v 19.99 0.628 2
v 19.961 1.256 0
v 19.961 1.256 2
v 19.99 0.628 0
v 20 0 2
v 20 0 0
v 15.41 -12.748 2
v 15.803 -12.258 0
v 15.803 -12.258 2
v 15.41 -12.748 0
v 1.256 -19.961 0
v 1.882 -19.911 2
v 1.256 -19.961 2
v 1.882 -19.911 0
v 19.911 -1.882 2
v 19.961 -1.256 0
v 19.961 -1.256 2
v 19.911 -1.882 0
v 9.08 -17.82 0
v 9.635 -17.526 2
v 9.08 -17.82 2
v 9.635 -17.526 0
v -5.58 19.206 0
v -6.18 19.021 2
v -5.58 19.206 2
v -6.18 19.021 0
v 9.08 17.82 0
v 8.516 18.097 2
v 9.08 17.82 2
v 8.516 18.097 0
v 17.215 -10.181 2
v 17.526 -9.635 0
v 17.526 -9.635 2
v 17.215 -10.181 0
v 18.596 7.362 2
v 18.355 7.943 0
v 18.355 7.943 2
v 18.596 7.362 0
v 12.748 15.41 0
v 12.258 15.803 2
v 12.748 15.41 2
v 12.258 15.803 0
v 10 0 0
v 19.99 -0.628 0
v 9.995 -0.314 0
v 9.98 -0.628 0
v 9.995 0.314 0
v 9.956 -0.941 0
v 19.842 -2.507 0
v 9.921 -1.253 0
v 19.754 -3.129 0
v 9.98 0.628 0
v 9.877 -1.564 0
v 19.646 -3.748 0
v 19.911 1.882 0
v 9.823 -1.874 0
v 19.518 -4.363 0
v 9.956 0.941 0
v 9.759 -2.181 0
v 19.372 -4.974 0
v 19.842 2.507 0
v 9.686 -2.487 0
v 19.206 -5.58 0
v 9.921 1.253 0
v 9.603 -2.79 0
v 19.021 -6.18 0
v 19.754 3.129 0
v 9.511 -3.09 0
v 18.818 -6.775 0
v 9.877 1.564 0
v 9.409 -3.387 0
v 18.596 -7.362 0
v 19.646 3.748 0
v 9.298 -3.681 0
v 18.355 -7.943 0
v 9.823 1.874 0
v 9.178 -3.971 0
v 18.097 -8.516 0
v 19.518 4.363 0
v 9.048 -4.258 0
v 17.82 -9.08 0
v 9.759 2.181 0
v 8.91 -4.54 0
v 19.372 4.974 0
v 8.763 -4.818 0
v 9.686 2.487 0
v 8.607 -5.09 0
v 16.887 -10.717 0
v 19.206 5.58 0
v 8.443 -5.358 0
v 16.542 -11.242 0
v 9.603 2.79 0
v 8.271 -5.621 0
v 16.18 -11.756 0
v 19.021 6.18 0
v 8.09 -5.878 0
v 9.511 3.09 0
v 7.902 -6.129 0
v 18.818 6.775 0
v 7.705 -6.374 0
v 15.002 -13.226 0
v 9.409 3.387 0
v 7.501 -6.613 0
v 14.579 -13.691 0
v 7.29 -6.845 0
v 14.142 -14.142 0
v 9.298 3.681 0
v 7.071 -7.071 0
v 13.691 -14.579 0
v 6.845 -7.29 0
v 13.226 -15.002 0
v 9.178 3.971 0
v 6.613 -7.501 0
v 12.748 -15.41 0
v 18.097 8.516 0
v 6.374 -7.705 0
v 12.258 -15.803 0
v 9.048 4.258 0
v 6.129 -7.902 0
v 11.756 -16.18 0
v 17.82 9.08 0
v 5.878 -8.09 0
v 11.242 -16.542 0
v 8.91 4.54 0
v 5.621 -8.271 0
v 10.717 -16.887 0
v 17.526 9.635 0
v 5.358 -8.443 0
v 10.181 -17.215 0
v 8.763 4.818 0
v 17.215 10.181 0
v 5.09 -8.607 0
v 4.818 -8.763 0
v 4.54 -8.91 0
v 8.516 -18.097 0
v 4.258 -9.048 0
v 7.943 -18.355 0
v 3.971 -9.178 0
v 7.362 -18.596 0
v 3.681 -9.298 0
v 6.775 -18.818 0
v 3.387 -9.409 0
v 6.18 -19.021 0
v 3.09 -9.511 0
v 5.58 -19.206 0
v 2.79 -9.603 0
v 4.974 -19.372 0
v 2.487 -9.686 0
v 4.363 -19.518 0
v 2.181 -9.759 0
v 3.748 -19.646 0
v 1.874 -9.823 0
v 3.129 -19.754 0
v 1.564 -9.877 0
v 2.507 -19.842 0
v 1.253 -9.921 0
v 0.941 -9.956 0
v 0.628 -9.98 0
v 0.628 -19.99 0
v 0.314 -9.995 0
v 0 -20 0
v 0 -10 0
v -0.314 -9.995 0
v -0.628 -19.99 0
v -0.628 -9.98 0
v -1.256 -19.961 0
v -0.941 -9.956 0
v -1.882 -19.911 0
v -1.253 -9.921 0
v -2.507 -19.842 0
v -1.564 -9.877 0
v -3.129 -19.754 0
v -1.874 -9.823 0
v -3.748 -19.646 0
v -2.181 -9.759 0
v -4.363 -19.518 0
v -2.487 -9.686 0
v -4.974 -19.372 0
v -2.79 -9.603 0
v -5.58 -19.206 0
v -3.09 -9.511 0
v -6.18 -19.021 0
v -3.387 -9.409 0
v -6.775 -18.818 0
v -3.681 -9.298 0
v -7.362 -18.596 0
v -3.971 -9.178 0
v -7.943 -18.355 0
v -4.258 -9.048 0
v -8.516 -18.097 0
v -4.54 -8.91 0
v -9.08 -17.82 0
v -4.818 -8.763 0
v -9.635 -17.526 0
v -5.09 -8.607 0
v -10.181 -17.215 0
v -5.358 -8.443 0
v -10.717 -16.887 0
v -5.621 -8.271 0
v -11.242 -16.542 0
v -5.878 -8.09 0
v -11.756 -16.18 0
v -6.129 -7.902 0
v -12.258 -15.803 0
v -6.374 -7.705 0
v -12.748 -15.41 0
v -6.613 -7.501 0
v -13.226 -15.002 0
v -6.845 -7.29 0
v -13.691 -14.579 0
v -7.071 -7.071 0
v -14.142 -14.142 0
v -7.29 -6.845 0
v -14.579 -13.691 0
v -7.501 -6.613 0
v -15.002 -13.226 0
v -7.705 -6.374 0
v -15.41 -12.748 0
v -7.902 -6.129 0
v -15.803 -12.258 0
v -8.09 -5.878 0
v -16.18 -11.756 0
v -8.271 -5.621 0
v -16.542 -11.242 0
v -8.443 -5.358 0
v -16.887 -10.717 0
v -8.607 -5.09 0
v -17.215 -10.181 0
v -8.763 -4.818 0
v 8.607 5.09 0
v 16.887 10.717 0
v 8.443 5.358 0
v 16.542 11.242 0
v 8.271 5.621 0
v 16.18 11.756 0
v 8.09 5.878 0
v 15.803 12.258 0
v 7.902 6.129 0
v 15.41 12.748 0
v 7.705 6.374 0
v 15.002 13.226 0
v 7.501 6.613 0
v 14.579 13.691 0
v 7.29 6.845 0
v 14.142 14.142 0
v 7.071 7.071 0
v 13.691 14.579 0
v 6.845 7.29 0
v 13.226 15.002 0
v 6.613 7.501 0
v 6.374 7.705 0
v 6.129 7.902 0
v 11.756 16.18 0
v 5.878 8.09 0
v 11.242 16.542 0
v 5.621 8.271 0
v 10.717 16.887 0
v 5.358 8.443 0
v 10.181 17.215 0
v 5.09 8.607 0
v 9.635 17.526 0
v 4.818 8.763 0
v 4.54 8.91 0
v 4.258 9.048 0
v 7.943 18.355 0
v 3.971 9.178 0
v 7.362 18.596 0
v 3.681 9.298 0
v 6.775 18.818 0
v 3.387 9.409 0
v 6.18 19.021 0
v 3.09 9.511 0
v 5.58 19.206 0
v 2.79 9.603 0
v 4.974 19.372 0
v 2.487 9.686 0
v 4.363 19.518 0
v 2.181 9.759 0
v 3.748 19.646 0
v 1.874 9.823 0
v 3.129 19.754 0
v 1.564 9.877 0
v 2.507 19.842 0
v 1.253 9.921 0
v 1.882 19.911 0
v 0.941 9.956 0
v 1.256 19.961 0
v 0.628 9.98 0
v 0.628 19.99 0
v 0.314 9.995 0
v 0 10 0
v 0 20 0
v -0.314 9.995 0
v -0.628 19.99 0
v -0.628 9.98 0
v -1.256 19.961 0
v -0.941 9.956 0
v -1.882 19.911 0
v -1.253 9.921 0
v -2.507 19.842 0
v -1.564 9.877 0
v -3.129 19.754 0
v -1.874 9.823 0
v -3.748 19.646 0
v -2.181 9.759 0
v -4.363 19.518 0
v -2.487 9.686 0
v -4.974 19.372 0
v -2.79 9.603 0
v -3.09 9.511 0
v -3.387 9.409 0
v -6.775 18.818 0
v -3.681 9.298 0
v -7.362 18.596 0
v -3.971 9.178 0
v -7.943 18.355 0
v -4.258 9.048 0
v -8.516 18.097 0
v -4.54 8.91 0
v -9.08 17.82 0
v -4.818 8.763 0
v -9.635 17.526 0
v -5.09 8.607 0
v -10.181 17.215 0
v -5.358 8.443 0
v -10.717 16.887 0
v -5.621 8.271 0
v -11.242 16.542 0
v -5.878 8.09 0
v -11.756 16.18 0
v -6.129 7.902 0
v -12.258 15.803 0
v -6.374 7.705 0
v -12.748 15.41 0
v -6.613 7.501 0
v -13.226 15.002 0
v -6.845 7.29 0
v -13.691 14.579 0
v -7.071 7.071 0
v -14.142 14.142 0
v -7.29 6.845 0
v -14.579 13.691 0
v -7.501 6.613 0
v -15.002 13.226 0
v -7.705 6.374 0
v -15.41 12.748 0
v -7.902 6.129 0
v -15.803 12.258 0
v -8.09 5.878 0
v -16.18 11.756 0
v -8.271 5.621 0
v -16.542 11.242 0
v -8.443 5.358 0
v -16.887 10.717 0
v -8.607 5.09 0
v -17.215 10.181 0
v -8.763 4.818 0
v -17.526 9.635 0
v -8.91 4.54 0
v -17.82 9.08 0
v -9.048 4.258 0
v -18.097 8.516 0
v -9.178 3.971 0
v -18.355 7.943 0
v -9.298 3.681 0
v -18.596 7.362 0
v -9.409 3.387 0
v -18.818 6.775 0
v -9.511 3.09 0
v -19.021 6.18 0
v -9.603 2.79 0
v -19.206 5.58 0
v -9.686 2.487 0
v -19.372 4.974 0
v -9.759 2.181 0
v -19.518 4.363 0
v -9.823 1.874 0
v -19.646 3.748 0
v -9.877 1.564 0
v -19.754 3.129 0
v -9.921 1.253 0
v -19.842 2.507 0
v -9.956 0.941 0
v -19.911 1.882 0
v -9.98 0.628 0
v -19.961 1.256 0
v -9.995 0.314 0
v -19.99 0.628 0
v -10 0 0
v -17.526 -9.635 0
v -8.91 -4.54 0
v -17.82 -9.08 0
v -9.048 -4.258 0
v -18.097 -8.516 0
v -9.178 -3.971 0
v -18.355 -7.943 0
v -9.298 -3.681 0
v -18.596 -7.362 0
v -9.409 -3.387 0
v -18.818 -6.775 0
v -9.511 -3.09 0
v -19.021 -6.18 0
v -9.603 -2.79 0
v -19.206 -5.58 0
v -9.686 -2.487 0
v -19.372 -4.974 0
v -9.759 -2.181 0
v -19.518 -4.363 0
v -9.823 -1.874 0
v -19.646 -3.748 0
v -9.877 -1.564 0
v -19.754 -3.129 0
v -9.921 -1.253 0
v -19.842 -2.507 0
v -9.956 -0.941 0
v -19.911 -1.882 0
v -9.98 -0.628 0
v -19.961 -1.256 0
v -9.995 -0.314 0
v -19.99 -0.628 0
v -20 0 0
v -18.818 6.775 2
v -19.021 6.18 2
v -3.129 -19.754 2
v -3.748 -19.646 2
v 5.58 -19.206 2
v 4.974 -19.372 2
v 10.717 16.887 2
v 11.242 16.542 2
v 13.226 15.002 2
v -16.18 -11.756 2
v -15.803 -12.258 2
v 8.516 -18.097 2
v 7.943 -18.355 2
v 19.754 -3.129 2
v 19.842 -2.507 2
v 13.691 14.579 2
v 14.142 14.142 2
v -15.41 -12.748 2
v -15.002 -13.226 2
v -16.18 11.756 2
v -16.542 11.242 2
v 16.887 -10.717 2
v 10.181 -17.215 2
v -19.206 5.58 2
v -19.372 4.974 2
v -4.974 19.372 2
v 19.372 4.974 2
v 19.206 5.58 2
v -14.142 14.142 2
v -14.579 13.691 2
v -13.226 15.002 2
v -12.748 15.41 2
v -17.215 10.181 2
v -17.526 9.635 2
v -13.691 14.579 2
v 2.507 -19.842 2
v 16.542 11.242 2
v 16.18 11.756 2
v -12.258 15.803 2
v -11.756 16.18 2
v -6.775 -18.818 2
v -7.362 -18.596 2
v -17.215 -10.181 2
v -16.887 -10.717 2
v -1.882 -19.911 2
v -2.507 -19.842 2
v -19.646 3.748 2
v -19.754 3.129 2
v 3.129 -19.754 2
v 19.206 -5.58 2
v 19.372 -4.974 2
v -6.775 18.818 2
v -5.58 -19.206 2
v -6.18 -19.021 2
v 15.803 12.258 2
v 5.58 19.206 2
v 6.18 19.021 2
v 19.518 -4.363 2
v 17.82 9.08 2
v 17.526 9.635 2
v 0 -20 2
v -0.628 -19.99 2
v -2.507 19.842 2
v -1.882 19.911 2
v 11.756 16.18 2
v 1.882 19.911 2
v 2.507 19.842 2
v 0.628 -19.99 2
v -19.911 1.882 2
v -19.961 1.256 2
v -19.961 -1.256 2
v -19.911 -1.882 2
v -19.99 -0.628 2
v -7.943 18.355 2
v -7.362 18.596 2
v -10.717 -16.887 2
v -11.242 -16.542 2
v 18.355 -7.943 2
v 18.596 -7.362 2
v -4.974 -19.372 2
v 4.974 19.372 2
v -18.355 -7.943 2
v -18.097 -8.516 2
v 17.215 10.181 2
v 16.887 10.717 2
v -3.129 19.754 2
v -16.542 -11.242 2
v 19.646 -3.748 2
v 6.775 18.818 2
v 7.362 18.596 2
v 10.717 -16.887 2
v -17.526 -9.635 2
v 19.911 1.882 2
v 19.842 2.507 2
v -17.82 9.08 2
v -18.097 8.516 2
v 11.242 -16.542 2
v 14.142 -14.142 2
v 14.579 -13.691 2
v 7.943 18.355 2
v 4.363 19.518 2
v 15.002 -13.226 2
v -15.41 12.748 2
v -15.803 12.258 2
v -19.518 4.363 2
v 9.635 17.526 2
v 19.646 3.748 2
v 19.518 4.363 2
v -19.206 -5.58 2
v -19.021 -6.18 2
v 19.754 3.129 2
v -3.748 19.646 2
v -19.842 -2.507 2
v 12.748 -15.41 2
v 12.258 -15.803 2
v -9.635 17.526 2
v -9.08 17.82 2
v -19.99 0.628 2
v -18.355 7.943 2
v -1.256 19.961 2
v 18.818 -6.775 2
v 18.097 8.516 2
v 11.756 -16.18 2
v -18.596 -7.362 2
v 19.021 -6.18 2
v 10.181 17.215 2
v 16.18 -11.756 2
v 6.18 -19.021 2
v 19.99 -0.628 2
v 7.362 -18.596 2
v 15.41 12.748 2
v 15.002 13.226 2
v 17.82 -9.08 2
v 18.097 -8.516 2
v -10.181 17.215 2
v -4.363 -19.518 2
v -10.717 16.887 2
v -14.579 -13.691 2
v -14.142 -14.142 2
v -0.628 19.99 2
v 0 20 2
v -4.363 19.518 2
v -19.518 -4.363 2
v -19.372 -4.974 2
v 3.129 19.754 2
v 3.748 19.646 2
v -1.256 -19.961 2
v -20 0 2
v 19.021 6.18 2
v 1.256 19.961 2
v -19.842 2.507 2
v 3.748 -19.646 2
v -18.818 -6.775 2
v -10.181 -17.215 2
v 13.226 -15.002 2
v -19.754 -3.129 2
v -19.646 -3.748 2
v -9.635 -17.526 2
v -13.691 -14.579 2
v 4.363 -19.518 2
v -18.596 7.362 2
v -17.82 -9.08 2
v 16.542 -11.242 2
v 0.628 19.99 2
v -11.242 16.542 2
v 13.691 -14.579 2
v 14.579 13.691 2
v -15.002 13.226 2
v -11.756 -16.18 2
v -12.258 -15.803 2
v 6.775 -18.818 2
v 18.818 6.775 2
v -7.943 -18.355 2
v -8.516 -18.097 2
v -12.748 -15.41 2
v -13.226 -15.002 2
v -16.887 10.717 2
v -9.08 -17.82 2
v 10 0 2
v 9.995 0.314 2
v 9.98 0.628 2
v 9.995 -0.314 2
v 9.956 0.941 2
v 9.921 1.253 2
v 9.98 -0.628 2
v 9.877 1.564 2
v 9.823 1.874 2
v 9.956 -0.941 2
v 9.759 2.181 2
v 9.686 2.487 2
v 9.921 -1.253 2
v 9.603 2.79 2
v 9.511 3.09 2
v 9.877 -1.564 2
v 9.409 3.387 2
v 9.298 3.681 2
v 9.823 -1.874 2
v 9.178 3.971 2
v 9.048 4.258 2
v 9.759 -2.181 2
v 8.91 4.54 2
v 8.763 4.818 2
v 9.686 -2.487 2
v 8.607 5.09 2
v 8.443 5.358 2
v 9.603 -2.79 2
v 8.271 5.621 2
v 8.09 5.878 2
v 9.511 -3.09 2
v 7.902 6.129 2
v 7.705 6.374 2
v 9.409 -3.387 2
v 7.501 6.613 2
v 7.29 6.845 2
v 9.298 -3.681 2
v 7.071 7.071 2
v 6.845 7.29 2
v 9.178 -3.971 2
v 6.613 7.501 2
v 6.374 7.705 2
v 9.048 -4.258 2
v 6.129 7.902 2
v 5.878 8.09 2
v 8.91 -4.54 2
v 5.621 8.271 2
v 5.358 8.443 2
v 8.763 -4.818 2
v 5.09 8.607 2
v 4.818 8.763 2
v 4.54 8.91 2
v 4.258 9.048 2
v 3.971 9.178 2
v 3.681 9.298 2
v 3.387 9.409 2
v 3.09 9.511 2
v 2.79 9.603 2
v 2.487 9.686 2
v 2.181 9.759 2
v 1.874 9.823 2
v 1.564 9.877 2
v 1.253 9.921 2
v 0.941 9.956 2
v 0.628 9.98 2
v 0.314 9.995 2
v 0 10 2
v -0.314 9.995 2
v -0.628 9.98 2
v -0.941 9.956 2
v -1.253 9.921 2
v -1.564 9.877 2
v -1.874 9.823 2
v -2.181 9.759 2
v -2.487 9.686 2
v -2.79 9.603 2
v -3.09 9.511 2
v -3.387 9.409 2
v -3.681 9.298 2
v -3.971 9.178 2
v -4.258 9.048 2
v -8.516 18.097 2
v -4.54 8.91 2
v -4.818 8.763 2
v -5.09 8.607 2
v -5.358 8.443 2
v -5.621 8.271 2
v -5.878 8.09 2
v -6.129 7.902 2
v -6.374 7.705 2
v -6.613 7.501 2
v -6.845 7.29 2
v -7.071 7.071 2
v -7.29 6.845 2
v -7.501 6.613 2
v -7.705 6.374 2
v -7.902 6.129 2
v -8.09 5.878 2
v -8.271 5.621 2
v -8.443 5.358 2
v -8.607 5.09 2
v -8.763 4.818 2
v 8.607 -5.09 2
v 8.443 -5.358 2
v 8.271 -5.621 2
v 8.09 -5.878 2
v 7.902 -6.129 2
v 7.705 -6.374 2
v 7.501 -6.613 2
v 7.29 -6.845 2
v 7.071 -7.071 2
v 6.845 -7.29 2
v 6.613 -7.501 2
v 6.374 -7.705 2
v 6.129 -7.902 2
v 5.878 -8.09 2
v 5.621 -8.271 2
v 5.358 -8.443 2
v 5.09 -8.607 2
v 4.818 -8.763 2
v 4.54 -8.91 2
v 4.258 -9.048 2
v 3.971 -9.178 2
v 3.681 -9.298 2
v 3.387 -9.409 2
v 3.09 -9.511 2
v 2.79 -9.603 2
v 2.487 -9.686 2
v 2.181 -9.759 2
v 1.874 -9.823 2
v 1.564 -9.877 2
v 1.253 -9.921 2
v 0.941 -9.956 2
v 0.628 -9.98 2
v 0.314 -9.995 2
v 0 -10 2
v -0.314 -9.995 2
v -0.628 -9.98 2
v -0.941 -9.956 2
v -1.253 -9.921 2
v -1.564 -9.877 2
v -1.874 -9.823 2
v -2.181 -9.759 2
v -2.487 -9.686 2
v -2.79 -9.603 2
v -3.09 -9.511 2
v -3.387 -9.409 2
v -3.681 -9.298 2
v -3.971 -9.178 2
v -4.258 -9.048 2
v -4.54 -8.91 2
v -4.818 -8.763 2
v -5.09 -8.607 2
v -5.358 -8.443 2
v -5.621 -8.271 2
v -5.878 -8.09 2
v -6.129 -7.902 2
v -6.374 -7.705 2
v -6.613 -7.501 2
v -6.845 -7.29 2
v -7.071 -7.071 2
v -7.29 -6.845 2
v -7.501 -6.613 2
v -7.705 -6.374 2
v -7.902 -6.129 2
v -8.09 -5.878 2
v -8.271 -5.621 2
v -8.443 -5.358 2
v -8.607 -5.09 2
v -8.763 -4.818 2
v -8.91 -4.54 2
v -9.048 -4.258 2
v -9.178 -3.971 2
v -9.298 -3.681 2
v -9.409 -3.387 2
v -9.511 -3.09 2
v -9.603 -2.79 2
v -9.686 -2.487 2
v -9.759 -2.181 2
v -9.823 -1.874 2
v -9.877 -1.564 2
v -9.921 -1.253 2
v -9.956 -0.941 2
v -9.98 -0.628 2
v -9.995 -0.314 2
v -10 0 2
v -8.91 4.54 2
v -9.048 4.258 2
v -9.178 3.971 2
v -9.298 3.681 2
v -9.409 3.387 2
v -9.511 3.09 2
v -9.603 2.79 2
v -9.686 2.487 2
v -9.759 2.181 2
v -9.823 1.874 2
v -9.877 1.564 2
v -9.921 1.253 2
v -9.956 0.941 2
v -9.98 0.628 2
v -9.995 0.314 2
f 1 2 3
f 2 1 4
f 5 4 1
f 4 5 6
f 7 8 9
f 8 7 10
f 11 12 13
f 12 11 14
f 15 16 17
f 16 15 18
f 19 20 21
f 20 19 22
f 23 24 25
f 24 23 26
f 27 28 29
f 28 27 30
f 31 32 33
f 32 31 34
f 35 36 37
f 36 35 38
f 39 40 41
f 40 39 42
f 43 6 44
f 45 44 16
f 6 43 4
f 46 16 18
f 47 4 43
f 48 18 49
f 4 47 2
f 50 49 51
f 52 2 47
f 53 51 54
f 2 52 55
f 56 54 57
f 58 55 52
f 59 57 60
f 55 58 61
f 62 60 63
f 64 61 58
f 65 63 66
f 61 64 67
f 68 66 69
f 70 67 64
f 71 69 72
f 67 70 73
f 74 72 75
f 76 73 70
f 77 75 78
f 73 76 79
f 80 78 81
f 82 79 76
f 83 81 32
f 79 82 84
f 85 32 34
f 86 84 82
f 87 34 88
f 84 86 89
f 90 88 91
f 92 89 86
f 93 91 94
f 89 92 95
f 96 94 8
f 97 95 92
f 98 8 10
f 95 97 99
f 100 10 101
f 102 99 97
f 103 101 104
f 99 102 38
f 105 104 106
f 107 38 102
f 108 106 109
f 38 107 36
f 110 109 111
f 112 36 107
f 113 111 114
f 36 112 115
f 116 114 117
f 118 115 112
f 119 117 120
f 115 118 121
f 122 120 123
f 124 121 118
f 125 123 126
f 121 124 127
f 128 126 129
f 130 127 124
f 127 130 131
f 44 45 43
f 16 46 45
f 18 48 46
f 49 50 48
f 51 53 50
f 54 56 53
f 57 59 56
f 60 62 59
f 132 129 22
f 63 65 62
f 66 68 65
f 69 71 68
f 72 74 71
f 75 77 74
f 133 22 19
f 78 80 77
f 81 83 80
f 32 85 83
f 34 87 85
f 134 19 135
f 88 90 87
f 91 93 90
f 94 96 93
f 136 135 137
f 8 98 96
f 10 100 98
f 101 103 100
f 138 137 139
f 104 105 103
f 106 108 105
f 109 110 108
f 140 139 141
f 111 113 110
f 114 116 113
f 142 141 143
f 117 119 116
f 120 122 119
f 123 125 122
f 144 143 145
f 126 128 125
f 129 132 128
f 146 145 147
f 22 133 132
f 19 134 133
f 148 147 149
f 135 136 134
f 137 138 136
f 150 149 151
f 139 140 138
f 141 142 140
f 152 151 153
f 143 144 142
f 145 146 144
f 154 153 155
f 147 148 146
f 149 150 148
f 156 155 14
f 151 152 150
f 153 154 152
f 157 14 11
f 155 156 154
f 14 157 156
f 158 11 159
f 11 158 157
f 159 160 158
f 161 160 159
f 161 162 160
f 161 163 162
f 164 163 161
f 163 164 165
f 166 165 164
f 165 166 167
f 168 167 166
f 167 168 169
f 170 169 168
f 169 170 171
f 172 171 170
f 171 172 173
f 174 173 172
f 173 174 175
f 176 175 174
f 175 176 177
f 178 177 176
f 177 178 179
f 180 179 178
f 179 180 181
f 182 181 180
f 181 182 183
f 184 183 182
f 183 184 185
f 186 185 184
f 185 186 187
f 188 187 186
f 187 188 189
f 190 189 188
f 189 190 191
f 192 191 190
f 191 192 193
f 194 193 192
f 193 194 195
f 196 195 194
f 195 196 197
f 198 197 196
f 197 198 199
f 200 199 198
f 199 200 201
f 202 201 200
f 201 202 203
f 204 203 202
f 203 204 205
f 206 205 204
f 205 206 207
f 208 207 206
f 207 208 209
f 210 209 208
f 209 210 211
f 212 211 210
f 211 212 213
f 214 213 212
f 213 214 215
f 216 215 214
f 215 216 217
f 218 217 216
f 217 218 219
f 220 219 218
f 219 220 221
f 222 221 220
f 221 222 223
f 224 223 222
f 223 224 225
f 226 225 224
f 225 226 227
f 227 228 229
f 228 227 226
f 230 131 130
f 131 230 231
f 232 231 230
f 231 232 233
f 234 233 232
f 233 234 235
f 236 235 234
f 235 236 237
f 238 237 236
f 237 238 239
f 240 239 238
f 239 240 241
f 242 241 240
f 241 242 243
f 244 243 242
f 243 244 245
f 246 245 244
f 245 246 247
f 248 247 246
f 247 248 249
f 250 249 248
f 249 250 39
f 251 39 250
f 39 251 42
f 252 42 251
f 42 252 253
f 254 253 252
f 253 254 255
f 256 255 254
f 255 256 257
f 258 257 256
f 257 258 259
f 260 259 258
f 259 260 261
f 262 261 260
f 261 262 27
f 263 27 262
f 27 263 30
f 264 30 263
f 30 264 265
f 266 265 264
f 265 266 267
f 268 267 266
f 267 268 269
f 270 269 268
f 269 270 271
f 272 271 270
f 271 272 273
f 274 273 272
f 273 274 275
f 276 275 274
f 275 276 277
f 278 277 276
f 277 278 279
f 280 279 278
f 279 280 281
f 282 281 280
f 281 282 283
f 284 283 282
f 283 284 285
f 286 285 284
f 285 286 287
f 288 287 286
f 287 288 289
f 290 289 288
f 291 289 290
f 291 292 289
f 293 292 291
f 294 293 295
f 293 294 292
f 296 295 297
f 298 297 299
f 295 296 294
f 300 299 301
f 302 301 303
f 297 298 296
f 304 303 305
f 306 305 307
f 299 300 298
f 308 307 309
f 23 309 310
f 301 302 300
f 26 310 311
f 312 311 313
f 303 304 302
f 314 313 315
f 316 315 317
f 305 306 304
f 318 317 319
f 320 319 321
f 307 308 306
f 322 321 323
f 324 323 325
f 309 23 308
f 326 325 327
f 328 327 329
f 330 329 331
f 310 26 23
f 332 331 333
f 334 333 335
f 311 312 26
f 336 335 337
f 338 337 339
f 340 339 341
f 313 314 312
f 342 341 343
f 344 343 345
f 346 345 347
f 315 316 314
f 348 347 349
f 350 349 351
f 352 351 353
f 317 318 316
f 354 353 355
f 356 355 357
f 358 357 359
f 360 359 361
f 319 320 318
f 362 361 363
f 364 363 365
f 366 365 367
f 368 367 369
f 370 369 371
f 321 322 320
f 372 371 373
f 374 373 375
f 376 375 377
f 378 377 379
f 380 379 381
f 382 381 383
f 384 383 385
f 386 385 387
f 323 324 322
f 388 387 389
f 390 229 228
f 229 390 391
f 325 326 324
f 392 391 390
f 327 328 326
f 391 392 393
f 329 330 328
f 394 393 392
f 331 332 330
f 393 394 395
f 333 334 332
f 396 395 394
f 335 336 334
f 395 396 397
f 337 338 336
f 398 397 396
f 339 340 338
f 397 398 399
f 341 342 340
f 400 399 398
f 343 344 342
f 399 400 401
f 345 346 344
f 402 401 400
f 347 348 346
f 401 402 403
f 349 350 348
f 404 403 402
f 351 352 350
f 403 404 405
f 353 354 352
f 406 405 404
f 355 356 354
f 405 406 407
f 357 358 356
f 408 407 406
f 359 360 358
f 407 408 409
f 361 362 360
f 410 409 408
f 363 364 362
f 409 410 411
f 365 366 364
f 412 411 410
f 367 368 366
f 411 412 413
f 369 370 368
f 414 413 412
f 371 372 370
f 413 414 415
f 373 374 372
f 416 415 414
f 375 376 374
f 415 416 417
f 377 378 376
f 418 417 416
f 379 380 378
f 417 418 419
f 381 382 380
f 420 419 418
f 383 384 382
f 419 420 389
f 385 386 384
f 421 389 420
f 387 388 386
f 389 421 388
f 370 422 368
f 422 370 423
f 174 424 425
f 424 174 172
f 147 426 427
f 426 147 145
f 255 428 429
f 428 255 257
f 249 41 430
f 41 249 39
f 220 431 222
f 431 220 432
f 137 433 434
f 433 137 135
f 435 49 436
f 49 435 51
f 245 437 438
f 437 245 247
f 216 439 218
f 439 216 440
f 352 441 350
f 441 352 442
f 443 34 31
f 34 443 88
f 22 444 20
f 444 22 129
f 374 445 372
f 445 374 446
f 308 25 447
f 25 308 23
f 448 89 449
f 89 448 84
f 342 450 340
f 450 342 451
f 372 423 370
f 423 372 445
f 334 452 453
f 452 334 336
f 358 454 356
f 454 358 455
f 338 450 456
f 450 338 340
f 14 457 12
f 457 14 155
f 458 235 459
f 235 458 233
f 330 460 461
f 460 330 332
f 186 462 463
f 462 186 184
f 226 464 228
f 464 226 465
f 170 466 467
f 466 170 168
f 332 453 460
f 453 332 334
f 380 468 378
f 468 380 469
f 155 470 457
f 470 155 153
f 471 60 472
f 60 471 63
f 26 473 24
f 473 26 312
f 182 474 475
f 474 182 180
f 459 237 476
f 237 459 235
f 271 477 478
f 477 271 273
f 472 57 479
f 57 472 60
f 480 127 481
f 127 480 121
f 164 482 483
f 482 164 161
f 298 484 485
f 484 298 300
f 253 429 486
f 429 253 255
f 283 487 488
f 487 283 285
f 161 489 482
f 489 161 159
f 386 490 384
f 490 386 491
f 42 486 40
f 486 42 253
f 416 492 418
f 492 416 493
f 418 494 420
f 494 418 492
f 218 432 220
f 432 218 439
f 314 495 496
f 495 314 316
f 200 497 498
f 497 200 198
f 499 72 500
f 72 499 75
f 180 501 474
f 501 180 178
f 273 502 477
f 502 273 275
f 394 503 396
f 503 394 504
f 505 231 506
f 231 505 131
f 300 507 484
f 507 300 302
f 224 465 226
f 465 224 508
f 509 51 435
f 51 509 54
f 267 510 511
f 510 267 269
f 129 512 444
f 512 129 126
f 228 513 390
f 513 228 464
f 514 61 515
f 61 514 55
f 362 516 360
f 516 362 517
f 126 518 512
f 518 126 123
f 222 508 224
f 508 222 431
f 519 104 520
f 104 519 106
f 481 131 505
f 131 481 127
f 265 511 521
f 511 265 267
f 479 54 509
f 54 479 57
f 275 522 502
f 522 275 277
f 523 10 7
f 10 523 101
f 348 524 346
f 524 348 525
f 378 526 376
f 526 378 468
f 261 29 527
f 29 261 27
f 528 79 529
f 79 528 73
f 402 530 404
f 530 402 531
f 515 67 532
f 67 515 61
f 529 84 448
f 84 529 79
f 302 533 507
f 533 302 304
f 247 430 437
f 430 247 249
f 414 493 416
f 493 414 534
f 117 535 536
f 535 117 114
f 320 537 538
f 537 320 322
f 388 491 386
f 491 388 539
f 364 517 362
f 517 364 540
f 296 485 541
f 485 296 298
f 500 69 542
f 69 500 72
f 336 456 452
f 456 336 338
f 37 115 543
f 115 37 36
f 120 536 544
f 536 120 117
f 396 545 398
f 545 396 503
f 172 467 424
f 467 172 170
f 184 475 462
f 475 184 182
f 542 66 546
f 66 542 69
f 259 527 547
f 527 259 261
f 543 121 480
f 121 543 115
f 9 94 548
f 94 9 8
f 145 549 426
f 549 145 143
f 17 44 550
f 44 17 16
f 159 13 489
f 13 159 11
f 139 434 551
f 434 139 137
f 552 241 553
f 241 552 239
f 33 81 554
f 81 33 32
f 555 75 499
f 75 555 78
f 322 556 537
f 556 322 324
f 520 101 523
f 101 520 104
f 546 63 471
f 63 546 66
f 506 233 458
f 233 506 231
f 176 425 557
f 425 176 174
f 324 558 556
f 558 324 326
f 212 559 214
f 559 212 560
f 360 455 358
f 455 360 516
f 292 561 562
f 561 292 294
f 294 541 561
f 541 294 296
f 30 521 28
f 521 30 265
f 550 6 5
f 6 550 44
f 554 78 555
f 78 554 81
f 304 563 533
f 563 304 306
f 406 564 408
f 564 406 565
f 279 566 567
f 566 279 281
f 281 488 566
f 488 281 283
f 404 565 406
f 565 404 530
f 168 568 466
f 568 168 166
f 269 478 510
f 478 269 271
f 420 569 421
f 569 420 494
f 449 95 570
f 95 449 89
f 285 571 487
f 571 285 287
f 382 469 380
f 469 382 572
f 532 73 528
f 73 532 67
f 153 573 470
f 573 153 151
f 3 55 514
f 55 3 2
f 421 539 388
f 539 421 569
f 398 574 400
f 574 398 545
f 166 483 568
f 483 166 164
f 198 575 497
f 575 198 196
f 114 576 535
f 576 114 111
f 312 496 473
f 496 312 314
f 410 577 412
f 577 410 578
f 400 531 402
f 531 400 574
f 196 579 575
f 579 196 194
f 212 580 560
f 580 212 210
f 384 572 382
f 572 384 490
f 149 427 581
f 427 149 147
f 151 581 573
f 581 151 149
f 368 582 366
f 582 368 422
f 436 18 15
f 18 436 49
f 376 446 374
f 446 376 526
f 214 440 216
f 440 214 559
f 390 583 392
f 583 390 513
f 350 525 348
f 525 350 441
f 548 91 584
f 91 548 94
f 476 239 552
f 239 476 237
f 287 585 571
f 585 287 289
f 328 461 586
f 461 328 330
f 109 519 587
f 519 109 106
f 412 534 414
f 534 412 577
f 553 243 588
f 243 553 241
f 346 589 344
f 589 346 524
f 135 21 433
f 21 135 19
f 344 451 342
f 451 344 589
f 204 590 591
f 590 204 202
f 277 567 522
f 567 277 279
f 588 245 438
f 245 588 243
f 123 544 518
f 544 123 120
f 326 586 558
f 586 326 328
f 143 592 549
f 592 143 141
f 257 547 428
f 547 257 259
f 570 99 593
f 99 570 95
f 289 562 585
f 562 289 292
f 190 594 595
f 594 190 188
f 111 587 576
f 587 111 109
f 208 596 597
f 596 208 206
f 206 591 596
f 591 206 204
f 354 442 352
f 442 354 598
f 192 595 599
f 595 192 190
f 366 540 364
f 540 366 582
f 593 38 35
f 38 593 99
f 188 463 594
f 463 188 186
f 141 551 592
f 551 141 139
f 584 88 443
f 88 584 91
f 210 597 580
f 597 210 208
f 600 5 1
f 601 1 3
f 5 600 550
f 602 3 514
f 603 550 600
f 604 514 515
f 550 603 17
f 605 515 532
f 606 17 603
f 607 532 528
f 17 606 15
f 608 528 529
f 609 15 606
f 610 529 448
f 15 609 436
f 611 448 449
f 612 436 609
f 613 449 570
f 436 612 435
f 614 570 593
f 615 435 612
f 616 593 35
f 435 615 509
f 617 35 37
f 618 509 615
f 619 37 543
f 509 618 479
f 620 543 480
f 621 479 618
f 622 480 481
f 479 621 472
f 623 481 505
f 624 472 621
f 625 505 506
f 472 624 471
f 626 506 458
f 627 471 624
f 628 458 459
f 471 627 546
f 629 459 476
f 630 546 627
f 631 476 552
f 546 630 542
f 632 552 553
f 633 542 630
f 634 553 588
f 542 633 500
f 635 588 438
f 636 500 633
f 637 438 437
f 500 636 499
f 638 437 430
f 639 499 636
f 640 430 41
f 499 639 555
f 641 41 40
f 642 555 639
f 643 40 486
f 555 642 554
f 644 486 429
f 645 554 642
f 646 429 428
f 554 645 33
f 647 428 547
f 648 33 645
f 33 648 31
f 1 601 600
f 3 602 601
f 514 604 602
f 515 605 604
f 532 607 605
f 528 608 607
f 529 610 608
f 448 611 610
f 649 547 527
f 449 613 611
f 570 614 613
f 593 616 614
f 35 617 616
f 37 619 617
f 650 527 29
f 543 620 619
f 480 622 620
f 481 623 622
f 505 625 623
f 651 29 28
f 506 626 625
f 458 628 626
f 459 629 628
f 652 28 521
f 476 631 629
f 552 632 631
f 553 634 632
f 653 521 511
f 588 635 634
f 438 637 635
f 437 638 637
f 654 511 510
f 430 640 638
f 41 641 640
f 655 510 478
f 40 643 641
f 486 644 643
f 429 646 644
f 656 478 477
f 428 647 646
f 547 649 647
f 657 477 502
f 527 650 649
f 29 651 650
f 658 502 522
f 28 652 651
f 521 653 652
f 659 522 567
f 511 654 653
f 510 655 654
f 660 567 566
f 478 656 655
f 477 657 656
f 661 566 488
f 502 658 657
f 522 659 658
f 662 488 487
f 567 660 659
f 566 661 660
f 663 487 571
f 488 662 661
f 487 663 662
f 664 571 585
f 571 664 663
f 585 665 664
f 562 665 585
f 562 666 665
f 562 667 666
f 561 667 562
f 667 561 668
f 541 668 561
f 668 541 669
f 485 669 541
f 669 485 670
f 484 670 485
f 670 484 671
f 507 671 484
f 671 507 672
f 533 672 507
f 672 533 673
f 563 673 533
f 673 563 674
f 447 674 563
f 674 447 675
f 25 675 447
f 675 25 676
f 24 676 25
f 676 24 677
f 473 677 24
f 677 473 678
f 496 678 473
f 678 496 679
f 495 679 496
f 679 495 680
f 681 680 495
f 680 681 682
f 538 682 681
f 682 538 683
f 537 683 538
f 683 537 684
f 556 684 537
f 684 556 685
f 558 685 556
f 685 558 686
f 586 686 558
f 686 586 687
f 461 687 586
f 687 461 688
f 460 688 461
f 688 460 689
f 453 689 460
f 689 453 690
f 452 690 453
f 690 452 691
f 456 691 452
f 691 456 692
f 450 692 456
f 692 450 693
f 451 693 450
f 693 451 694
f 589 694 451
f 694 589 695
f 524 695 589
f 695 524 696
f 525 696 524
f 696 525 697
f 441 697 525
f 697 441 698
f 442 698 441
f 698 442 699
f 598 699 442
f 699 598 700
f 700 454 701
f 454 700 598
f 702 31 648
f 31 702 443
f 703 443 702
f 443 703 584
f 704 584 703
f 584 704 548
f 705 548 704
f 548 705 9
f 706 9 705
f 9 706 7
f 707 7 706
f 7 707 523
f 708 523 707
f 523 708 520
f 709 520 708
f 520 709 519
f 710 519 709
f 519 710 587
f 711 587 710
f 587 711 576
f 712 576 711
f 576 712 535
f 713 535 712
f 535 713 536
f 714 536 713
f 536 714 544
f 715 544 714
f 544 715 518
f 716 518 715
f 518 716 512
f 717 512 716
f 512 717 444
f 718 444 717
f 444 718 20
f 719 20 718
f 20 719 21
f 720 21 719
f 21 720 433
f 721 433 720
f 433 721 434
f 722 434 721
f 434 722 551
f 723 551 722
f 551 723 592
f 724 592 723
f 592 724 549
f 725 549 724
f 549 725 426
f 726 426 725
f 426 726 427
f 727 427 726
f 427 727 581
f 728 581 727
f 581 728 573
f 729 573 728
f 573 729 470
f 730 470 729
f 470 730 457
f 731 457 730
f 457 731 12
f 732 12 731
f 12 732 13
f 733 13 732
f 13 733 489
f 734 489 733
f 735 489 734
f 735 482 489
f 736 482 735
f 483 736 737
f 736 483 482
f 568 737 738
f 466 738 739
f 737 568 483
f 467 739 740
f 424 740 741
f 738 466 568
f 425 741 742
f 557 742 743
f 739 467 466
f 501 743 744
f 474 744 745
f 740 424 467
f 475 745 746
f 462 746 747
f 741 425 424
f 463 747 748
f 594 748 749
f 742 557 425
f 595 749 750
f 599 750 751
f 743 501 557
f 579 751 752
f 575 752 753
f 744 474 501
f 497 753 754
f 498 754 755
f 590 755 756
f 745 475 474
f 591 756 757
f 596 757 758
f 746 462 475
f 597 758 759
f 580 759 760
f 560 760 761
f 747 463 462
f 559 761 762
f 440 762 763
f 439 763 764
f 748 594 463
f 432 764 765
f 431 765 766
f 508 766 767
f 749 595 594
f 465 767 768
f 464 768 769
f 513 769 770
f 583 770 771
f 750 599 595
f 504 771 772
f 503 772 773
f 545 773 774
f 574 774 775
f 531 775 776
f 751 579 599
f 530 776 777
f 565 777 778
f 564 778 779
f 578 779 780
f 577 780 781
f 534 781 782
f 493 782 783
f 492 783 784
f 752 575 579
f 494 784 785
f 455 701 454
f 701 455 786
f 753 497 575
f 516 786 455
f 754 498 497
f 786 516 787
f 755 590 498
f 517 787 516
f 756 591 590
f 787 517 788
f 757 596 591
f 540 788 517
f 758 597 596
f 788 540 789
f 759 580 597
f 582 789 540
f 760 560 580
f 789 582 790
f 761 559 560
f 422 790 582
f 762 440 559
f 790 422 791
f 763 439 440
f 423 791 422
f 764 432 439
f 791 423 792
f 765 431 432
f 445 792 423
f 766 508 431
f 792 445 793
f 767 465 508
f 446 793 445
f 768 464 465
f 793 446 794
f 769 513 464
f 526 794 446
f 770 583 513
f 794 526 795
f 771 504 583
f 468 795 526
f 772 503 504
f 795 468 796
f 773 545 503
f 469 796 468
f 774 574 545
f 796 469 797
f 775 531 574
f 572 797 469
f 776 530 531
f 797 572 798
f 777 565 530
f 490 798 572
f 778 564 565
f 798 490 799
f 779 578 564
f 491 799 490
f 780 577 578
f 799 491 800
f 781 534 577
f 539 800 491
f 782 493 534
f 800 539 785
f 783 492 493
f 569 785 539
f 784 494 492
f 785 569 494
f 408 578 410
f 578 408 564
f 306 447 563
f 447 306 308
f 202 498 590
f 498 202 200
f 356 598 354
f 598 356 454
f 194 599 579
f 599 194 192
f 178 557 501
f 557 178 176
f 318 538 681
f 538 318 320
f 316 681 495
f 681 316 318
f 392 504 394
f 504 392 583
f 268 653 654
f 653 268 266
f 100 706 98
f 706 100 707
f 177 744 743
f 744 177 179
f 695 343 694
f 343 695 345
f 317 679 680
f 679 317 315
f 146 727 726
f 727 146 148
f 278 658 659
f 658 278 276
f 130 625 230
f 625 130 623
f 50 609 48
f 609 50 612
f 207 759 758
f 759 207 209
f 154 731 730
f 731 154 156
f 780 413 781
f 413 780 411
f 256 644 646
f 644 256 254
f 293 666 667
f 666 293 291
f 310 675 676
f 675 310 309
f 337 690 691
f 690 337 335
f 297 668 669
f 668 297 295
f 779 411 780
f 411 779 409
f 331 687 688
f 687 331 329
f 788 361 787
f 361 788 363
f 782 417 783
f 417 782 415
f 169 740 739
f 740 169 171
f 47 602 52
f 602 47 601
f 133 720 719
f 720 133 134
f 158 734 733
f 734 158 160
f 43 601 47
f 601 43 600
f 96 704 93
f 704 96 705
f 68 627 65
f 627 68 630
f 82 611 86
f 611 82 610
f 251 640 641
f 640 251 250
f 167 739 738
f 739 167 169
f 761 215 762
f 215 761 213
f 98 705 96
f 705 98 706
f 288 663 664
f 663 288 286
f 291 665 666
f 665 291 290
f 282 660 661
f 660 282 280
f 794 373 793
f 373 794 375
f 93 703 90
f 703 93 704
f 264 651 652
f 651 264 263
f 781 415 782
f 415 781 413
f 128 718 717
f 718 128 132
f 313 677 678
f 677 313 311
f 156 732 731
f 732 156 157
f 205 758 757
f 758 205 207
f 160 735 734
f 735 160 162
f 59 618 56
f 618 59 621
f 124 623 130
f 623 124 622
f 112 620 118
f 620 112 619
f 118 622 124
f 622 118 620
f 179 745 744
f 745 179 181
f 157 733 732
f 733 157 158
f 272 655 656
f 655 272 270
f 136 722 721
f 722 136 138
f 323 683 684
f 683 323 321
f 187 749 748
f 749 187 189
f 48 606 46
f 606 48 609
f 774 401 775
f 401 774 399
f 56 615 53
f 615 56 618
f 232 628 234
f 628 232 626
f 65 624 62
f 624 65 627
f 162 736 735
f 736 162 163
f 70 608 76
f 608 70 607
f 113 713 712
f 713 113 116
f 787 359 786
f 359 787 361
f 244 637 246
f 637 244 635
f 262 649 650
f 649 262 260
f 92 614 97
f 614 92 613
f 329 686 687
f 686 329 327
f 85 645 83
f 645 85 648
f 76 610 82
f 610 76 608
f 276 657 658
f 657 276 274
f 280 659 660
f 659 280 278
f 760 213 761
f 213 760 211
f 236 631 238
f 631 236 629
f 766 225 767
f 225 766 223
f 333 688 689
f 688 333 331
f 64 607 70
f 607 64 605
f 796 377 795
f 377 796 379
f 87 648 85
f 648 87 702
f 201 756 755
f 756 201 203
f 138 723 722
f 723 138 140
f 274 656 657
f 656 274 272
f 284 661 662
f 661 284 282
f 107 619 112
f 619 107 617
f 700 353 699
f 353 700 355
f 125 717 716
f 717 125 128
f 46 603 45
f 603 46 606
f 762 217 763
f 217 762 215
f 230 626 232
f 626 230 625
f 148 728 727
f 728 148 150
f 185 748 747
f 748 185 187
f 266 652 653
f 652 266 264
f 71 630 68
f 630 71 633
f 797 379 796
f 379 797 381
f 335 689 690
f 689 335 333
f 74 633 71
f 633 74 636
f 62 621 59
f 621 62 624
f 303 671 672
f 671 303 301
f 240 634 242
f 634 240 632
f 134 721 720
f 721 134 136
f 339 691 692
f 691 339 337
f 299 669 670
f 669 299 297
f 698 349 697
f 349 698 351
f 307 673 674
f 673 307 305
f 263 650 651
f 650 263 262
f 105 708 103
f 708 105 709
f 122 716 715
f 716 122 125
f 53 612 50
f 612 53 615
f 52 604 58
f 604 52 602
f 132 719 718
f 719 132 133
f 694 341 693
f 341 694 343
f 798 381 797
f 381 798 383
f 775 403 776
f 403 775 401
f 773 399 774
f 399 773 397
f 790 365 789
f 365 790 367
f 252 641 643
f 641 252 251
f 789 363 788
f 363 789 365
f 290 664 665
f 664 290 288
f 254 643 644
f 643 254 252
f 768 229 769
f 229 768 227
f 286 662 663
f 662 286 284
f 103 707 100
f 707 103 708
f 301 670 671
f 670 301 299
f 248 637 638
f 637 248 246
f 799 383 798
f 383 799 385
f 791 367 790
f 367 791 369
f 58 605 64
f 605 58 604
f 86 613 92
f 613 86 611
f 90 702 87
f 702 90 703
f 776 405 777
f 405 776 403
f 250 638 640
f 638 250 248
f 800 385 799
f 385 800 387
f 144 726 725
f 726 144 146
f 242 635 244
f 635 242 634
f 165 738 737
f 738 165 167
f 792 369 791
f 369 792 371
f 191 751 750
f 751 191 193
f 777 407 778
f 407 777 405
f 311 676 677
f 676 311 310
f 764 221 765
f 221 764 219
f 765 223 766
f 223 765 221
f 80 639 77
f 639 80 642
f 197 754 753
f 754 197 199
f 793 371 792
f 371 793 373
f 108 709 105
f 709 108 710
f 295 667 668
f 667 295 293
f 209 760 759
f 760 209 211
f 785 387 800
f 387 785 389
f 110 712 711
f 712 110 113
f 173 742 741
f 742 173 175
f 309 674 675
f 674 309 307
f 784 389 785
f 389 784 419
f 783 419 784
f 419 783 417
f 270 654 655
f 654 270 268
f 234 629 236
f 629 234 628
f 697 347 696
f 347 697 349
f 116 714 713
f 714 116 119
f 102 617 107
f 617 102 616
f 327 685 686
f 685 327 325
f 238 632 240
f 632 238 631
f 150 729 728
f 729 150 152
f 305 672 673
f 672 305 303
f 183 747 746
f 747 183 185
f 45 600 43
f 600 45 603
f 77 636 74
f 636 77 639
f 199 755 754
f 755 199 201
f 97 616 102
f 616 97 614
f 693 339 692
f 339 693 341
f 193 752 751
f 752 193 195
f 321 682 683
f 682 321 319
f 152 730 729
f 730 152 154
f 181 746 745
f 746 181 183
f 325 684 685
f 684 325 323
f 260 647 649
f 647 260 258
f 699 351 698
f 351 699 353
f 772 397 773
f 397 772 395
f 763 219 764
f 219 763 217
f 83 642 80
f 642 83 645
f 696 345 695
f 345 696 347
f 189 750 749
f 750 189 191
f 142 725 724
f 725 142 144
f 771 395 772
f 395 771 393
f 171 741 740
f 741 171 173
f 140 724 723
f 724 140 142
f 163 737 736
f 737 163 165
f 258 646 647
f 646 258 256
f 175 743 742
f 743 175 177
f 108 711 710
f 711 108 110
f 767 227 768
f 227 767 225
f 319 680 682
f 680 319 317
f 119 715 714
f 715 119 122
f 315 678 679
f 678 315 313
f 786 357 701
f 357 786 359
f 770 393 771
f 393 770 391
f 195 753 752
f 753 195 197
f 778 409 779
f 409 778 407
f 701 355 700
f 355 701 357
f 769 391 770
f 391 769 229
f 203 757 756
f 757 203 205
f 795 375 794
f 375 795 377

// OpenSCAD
$fn=200;
thiccness=2;
led_count=12;
od=40;
id=20;
led_od=3.5;

difference(){
    cylinder(h=thiccness, d=od);
    cylinder(h=thiccness, d=id);
}
